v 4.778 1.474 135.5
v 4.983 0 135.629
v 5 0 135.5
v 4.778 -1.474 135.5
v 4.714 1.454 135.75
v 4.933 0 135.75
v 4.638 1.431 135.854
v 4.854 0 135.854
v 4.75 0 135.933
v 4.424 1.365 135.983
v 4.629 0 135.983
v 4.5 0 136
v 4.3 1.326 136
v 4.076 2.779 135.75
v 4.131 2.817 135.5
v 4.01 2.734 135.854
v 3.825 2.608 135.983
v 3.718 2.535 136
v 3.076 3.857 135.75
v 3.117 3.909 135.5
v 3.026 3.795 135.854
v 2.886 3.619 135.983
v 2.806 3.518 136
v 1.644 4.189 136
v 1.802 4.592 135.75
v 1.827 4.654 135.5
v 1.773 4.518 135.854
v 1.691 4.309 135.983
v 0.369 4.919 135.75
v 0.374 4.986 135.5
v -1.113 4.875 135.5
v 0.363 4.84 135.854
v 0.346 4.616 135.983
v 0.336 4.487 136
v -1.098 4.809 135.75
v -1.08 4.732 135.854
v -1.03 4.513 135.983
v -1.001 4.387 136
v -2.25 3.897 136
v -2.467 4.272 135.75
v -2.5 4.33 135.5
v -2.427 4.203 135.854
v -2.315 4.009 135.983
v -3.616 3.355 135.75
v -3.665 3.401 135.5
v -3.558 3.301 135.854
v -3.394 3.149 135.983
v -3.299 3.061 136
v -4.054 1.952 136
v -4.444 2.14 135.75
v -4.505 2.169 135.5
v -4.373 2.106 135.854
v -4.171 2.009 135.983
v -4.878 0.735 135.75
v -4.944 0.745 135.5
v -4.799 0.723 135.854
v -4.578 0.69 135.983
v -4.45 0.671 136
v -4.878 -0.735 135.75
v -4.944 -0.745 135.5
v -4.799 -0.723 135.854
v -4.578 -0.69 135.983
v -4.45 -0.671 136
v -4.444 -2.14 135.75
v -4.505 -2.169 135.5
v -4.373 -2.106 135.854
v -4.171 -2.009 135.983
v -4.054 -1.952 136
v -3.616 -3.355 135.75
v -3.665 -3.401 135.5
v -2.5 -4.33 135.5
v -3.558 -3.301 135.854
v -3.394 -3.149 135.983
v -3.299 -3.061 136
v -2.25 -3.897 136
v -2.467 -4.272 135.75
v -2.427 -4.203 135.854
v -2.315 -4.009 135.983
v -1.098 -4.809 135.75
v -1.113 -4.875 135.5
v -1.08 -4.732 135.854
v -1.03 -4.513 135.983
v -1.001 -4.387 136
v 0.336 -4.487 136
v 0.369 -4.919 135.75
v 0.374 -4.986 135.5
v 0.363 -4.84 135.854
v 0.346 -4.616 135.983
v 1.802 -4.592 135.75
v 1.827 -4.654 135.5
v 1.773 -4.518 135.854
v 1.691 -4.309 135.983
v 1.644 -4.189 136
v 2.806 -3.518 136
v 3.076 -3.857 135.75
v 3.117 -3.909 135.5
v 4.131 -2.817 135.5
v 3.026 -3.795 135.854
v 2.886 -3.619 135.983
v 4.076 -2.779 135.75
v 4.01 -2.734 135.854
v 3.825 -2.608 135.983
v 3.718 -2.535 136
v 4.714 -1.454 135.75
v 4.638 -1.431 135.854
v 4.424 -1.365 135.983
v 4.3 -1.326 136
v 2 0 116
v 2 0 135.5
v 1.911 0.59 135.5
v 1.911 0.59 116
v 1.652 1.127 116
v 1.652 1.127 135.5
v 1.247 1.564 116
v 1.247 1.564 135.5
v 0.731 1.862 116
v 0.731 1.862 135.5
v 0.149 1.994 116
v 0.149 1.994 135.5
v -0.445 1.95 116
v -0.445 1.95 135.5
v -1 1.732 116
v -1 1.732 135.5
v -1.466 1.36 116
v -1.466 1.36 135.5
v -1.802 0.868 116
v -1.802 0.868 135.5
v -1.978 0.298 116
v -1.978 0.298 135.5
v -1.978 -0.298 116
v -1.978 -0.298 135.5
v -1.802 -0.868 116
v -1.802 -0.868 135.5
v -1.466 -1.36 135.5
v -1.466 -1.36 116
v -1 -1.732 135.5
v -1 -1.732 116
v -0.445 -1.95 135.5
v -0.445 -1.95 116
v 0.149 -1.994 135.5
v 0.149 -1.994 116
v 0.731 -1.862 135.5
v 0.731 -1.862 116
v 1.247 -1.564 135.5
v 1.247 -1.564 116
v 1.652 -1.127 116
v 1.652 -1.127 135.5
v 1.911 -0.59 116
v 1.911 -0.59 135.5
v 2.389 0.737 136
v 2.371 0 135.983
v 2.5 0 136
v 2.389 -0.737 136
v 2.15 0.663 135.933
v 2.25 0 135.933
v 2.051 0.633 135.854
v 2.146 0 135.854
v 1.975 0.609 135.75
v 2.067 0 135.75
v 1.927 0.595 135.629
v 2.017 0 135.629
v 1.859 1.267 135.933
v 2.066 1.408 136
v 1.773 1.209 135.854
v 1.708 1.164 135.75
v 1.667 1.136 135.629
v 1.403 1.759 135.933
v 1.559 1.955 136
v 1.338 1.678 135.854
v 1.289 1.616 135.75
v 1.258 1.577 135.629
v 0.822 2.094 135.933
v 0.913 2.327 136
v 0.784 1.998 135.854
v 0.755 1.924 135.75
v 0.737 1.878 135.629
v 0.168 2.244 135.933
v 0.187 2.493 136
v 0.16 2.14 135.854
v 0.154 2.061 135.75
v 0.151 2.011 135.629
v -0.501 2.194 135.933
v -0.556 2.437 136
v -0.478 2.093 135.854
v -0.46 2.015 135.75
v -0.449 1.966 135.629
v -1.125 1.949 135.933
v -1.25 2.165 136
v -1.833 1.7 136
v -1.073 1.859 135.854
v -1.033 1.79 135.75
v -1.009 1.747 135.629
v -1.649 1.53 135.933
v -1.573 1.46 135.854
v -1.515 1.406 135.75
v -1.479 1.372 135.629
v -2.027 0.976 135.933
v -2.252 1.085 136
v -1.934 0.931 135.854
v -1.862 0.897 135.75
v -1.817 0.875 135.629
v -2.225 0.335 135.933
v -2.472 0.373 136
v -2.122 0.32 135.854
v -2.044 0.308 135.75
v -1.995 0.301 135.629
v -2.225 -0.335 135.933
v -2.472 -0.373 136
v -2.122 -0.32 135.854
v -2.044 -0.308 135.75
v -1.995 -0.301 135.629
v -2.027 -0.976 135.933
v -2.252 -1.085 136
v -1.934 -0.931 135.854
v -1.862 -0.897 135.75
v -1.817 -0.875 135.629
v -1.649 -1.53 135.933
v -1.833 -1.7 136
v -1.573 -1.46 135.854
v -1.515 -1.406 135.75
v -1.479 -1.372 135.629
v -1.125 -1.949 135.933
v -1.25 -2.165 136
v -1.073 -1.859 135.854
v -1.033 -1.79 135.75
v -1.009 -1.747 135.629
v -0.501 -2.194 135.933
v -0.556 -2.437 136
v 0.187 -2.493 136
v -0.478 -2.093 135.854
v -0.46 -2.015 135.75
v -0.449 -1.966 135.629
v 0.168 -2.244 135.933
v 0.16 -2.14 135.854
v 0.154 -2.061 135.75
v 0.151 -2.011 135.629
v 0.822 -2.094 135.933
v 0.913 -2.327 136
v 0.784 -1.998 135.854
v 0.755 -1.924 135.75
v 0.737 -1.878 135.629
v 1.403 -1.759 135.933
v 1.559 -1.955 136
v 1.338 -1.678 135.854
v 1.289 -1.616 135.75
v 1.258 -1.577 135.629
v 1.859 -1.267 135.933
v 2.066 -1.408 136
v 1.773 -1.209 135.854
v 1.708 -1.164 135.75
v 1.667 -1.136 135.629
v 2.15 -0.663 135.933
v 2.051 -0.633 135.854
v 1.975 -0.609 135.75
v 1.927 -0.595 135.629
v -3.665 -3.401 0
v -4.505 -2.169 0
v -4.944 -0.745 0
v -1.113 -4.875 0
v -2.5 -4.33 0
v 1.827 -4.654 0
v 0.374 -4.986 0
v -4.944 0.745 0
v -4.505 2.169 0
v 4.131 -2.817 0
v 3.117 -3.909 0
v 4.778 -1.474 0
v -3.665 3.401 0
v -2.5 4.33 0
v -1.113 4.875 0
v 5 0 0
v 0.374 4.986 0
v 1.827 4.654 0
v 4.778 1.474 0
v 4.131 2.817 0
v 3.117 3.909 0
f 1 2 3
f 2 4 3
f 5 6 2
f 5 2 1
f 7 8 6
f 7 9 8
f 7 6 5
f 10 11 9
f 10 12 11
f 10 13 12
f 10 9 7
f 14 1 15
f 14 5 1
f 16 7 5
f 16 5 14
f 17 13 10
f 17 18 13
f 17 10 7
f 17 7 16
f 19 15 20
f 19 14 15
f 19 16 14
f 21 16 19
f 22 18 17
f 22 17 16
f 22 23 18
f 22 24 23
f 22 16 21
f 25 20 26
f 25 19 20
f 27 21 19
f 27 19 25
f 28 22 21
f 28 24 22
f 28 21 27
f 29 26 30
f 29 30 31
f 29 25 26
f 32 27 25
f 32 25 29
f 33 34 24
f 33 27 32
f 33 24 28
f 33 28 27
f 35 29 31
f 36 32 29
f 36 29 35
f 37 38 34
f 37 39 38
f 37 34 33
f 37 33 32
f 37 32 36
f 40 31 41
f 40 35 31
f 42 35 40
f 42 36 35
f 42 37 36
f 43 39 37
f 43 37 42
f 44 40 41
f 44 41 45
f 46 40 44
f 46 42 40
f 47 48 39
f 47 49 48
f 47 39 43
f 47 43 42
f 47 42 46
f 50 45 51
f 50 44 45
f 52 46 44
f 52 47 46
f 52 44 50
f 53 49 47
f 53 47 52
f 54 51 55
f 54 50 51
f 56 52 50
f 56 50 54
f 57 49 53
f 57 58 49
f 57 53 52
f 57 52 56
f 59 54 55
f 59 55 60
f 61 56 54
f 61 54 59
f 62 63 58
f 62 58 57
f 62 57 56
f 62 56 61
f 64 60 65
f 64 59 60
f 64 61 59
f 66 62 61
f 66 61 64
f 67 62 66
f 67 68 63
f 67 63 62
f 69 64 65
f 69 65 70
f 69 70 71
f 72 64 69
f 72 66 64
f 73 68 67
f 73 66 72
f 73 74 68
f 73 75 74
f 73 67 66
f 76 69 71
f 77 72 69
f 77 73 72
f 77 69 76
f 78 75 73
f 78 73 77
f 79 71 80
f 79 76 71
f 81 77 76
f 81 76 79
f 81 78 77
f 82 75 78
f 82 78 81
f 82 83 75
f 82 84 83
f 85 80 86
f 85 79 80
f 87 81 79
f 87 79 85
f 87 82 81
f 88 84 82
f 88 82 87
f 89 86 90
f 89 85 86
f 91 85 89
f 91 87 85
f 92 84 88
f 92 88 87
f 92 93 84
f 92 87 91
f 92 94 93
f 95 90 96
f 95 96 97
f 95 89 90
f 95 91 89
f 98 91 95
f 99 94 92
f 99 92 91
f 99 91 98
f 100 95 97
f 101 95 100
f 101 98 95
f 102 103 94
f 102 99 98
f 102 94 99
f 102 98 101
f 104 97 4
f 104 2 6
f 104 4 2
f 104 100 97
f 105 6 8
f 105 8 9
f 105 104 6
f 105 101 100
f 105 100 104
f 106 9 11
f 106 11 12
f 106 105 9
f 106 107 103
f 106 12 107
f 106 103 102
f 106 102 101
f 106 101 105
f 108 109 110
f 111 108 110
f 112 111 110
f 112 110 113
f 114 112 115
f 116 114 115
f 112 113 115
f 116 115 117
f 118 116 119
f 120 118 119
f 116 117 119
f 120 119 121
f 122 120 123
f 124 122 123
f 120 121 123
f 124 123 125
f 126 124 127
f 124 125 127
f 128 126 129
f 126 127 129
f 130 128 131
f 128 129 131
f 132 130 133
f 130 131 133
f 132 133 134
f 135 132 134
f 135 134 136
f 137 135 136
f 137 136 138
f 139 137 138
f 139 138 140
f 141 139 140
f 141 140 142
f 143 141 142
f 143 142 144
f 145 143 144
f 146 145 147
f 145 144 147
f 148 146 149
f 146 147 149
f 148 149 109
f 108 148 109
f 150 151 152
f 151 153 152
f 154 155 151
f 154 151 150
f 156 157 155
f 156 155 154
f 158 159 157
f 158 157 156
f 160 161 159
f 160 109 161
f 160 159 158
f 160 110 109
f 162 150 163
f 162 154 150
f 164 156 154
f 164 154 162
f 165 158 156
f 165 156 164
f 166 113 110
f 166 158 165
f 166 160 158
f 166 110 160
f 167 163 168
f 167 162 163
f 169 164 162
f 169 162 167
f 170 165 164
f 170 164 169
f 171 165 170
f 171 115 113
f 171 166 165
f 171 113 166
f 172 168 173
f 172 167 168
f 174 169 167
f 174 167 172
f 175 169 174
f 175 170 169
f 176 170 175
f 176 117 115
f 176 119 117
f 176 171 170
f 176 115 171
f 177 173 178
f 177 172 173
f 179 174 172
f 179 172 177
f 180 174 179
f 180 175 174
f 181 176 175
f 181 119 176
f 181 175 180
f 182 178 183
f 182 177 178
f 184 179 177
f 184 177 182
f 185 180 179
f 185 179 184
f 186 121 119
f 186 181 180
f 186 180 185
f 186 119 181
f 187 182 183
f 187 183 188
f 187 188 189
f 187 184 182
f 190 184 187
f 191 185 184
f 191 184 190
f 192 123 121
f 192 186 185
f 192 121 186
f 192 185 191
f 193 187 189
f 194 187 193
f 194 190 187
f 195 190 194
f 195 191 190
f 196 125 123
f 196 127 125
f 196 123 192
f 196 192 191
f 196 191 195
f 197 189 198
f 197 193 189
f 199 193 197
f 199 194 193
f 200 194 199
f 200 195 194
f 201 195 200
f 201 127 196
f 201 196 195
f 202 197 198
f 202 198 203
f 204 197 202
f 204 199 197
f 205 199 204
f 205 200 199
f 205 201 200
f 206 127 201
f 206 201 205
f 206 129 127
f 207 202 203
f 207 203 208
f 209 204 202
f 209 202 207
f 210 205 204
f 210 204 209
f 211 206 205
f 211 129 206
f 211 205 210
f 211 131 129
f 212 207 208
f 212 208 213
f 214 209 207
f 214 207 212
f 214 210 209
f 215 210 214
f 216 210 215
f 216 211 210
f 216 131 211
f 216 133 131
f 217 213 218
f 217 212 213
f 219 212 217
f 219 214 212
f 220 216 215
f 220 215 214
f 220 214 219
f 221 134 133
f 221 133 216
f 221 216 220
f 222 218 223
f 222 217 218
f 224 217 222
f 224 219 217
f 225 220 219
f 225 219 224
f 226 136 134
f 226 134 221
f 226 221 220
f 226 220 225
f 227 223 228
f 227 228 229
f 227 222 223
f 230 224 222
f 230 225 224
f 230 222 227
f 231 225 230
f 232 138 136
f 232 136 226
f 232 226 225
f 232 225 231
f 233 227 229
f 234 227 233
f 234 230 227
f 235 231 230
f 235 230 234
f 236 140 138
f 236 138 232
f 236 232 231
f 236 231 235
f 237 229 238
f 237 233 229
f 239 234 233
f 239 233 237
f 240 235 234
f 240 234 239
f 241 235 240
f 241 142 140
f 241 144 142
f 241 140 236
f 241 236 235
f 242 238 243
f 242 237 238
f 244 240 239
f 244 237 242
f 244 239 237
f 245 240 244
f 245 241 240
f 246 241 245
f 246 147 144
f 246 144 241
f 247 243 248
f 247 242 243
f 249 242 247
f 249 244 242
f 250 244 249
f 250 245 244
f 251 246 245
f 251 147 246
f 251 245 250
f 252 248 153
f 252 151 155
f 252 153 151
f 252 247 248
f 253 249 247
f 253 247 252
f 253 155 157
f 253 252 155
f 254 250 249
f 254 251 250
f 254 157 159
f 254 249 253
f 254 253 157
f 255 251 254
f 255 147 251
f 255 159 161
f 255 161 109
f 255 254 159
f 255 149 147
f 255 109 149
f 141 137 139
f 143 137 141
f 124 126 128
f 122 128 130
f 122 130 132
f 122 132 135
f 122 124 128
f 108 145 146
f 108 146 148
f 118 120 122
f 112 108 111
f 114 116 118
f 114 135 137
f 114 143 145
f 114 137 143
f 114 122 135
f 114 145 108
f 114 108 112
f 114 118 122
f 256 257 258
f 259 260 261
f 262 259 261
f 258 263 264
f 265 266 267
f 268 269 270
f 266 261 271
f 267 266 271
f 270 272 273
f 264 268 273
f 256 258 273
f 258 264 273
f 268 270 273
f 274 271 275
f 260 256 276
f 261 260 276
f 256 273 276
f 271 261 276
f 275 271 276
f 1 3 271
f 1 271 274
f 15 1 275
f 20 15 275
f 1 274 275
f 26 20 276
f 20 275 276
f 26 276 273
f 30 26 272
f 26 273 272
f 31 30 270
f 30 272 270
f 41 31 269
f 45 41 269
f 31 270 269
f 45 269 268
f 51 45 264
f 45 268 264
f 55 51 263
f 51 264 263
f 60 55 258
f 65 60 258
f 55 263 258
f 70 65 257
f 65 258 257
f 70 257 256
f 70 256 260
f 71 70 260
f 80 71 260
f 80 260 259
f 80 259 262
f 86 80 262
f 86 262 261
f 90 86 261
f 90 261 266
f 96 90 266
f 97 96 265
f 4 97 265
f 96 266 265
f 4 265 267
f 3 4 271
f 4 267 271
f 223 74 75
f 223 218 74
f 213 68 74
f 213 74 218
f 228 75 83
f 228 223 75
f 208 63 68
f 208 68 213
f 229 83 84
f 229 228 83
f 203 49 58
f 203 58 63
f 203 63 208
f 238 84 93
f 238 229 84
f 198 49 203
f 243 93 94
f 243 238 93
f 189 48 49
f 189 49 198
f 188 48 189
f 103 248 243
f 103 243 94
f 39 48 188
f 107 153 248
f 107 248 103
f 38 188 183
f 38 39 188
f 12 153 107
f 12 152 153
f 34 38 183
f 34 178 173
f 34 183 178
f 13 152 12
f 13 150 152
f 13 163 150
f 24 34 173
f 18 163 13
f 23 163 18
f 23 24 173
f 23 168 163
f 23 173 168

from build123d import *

# Parameters (mm, degrees)
SKETCH1_R           = 5
BOSS_EXTRUDE1_DEPTH = 136
SKETCH2_R           = 2
CUT_EXTRUDE1_DEPTH  = 20
FILLET1_R           = 0.5
FILLET2_R           = 0.5


with BuildPart() as part:
    # Sketch1 → Boss-Extrude1 (new body)
    with BuildSketch(Plane.XY):
        Circle(SKETCH1_R)
    extrude(amount=BOSS_EXTRUDE1_DEPTH)

    # Sketch2 → Cut-Extrude1 (cut)
    with BuildSketch(Plane.XY.offset(136)):
        Circle(SKETCH2_R)
    extrude(amount=-CUT_EXTRUDE1_DEPTH, mode=Mode.SUBTRACT)

    # Fillet1
    fillet1_edges = [part.edges().sort_by_distance(p)[0] for p in [
        (-5, 0, 136),
    ]]
    fillet(fillet1_edges, radius=FILLET1_R)

    # Fillet2
    fillet2_edges = [part.edges().sort_by_distance(p)[0] for p in [
        (-2, 0, 136),
    ]]
    fillet(fillet2_edges, radius=FILLET2_R)


solid = part.part
